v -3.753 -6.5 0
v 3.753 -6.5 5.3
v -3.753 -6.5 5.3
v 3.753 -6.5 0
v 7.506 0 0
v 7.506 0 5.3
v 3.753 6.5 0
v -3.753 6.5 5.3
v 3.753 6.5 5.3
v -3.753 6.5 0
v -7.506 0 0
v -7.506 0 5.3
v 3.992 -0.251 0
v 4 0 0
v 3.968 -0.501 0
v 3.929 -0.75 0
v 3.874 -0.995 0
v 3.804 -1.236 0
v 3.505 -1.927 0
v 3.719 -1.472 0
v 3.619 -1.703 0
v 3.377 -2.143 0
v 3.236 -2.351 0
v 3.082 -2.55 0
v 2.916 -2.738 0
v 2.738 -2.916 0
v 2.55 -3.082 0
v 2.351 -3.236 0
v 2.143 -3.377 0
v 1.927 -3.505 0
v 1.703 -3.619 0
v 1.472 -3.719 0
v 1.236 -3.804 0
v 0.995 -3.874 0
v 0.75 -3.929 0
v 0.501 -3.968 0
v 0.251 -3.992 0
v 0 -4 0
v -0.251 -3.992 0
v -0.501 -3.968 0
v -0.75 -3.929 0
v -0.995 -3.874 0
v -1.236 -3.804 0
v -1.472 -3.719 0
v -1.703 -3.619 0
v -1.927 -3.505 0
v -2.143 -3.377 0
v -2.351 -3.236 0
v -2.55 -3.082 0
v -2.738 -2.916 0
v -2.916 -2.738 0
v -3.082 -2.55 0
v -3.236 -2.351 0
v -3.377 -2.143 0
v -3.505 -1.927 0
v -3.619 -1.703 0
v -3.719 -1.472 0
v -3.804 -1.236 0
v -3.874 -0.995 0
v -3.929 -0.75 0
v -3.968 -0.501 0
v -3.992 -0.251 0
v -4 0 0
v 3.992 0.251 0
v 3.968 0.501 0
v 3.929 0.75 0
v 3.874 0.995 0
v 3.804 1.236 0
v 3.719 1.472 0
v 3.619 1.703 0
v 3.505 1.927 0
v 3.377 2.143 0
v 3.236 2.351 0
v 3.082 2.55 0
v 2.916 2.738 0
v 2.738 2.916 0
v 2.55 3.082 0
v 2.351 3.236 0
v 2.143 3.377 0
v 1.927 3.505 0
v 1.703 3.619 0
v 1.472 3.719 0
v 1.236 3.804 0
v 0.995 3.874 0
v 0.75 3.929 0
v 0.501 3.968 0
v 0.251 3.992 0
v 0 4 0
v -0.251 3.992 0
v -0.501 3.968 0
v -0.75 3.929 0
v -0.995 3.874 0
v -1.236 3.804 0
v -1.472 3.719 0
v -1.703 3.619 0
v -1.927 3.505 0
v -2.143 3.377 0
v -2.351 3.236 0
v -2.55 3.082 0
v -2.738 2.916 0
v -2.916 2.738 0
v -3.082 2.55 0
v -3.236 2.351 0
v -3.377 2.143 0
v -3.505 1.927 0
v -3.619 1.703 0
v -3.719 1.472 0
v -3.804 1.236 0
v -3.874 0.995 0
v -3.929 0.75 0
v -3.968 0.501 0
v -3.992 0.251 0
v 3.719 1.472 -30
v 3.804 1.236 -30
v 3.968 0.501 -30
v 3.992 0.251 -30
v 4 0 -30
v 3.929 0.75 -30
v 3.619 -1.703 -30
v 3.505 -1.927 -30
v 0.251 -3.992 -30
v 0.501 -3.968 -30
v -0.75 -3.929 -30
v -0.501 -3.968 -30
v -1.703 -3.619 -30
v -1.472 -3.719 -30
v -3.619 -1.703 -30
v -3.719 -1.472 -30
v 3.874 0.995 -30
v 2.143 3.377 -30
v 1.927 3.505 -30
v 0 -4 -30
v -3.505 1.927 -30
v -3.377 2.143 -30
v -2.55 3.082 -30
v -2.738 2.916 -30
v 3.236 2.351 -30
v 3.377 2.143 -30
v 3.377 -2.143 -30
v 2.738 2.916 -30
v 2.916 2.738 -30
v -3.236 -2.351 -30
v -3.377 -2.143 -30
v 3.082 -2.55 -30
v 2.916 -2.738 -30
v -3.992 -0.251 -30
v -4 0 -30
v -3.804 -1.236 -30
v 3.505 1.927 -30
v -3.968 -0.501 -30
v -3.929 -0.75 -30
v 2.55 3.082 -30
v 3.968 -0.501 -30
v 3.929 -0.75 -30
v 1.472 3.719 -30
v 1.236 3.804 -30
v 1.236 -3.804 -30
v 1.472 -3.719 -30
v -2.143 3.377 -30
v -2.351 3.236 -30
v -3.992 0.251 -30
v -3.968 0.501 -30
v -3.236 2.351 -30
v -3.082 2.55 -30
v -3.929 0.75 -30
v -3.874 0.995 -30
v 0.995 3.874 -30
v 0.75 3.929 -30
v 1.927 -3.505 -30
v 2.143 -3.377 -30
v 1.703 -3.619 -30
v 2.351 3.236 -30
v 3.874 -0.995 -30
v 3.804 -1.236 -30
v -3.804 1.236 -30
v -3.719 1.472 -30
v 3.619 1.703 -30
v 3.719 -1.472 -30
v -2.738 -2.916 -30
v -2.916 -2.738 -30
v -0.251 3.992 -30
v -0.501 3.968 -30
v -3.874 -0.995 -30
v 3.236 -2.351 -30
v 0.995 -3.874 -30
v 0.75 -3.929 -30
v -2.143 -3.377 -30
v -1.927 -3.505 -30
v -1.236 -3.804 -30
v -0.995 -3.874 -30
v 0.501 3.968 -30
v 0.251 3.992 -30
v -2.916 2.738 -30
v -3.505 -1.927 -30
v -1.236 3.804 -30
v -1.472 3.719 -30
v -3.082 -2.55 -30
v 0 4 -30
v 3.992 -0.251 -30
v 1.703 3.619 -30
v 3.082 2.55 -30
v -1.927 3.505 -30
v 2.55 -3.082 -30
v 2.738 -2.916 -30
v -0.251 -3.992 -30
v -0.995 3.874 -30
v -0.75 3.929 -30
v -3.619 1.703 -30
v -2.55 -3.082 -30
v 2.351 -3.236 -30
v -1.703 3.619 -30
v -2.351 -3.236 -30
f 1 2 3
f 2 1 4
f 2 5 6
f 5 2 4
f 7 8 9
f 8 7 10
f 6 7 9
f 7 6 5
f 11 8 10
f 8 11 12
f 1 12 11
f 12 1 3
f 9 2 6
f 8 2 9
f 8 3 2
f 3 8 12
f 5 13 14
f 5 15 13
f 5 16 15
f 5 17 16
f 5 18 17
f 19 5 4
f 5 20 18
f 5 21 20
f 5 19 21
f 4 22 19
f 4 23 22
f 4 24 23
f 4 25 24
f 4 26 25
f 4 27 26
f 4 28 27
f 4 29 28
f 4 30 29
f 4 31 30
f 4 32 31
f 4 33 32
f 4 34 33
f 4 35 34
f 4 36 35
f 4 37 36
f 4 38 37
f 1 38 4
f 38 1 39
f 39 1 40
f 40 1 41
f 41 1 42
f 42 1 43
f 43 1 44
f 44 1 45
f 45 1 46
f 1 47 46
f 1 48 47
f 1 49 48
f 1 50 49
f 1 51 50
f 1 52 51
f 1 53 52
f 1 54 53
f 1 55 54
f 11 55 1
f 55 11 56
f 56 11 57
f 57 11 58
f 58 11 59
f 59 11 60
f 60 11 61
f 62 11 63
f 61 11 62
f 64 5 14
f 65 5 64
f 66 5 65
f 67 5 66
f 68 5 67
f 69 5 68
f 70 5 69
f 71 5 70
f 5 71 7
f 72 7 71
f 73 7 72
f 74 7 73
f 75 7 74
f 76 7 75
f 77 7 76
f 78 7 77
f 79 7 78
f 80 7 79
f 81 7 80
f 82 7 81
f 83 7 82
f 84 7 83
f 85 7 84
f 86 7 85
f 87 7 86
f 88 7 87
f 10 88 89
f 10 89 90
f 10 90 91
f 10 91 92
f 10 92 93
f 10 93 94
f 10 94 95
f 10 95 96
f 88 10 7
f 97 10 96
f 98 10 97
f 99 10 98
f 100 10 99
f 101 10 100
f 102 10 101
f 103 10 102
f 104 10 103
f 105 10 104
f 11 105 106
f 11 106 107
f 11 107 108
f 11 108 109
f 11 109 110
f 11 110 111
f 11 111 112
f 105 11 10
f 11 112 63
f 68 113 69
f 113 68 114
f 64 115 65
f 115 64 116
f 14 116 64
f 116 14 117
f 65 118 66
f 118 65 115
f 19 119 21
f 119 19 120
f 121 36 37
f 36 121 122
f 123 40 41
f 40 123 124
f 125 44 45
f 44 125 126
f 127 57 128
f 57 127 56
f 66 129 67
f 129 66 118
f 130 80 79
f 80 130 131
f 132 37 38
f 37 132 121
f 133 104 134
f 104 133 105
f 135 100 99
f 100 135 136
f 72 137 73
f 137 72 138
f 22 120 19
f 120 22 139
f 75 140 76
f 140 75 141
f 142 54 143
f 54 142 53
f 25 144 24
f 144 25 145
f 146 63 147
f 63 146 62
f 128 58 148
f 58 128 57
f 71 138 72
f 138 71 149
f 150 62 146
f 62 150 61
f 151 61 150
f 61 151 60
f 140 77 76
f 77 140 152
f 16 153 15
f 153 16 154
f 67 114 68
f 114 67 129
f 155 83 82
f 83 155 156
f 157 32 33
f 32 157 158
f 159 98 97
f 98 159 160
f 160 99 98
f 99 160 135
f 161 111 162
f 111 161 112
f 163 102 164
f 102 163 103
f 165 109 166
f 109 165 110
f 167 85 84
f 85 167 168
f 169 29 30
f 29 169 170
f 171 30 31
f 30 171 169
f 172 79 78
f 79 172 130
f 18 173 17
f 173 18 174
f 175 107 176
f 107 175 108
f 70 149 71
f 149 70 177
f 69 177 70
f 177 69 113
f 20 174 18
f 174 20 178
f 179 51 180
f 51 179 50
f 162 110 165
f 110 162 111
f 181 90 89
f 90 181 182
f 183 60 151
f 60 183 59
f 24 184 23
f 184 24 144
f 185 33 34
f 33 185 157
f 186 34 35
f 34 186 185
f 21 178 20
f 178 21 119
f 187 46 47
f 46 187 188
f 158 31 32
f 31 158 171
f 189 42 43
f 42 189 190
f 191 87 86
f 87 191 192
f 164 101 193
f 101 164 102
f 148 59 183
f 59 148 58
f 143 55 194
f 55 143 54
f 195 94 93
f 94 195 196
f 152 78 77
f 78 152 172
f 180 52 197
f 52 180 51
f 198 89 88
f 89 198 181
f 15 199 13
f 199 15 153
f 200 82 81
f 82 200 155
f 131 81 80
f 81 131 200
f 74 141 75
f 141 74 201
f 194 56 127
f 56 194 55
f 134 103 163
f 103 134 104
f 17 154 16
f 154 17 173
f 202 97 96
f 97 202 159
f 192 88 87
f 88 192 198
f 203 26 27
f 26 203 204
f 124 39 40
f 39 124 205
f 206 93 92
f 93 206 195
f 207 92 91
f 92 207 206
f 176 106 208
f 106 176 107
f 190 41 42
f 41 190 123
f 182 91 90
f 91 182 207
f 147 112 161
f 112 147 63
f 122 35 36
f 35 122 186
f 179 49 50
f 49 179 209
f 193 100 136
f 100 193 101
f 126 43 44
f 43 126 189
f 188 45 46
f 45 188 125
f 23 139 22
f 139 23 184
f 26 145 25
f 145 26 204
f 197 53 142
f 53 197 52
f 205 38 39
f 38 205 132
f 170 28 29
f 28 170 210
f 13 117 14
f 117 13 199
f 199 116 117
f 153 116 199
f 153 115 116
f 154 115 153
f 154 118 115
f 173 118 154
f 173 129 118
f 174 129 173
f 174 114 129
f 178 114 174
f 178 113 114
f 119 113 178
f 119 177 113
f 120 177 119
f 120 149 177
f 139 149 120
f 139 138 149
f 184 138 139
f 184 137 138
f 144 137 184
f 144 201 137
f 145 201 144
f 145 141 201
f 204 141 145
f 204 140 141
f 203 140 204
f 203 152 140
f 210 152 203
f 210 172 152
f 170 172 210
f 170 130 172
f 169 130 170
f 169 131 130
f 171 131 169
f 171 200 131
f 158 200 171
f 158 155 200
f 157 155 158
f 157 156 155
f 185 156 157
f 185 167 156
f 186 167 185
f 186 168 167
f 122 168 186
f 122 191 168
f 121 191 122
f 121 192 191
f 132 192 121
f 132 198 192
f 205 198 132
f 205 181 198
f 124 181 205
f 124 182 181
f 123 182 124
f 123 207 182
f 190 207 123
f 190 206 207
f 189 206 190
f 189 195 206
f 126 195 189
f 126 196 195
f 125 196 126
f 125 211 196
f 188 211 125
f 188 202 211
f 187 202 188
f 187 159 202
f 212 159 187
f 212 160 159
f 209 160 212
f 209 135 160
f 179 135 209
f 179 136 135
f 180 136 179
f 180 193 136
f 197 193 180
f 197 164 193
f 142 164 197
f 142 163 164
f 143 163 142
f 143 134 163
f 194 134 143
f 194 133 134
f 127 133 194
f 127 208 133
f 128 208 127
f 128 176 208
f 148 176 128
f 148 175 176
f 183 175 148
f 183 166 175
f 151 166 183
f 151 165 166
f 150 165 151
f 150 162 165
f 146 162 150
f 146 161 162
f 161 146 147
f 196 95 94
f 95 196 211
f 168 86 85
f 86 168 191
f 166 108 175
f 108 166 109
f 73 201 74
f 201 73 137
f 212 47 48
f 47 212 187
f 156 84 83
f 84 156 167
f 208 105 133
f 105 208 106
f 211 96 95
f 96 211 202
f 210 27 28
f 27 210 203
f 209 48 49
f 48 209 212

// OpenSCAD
// M8 Hex Bolt (simplified, no thread)

// Parameters
head_across_flats = 13;   // 対辺距離
head_height = 5.3;        // 頭部高さ
shank_diameter = 8;       // シャンク直径
shank_length = 30;        // シャンク長さ

// 六角形の外接円半径 = 対辺距離 / cos(30)
head_circumradius = head_across_flats / cos(180/6);

module hex_bolt() {
    // 頭部: 六角柱、底面がz=0から始まりz=head_heightまで
    translate([0, 0, 0])
        cylinder(h = head_height, r = head_circumradius / 2 * 2 / 2, $fn = 6);

    // シャンク: z<0側へ伸びる円柱
    translate([0, 0, -shank_length])
        cylinder(h = shank_length, d = shank_diameter, $fn = 100);
}

// 六角柱の半径計算を修正して正しく配置
module hex_bolt_correct() {
    r_hex = head_across_flats / (2 * cos(30));

    // 頭部
    cylinder(h = head_height, r = r_hex, $fn = 6);

    // シャンク
    translate([0, 0, -shank_length])
        cylinder(h = shank_length, d = shank_diameter, $fn = 100);
}

hex_bolt_correct();
